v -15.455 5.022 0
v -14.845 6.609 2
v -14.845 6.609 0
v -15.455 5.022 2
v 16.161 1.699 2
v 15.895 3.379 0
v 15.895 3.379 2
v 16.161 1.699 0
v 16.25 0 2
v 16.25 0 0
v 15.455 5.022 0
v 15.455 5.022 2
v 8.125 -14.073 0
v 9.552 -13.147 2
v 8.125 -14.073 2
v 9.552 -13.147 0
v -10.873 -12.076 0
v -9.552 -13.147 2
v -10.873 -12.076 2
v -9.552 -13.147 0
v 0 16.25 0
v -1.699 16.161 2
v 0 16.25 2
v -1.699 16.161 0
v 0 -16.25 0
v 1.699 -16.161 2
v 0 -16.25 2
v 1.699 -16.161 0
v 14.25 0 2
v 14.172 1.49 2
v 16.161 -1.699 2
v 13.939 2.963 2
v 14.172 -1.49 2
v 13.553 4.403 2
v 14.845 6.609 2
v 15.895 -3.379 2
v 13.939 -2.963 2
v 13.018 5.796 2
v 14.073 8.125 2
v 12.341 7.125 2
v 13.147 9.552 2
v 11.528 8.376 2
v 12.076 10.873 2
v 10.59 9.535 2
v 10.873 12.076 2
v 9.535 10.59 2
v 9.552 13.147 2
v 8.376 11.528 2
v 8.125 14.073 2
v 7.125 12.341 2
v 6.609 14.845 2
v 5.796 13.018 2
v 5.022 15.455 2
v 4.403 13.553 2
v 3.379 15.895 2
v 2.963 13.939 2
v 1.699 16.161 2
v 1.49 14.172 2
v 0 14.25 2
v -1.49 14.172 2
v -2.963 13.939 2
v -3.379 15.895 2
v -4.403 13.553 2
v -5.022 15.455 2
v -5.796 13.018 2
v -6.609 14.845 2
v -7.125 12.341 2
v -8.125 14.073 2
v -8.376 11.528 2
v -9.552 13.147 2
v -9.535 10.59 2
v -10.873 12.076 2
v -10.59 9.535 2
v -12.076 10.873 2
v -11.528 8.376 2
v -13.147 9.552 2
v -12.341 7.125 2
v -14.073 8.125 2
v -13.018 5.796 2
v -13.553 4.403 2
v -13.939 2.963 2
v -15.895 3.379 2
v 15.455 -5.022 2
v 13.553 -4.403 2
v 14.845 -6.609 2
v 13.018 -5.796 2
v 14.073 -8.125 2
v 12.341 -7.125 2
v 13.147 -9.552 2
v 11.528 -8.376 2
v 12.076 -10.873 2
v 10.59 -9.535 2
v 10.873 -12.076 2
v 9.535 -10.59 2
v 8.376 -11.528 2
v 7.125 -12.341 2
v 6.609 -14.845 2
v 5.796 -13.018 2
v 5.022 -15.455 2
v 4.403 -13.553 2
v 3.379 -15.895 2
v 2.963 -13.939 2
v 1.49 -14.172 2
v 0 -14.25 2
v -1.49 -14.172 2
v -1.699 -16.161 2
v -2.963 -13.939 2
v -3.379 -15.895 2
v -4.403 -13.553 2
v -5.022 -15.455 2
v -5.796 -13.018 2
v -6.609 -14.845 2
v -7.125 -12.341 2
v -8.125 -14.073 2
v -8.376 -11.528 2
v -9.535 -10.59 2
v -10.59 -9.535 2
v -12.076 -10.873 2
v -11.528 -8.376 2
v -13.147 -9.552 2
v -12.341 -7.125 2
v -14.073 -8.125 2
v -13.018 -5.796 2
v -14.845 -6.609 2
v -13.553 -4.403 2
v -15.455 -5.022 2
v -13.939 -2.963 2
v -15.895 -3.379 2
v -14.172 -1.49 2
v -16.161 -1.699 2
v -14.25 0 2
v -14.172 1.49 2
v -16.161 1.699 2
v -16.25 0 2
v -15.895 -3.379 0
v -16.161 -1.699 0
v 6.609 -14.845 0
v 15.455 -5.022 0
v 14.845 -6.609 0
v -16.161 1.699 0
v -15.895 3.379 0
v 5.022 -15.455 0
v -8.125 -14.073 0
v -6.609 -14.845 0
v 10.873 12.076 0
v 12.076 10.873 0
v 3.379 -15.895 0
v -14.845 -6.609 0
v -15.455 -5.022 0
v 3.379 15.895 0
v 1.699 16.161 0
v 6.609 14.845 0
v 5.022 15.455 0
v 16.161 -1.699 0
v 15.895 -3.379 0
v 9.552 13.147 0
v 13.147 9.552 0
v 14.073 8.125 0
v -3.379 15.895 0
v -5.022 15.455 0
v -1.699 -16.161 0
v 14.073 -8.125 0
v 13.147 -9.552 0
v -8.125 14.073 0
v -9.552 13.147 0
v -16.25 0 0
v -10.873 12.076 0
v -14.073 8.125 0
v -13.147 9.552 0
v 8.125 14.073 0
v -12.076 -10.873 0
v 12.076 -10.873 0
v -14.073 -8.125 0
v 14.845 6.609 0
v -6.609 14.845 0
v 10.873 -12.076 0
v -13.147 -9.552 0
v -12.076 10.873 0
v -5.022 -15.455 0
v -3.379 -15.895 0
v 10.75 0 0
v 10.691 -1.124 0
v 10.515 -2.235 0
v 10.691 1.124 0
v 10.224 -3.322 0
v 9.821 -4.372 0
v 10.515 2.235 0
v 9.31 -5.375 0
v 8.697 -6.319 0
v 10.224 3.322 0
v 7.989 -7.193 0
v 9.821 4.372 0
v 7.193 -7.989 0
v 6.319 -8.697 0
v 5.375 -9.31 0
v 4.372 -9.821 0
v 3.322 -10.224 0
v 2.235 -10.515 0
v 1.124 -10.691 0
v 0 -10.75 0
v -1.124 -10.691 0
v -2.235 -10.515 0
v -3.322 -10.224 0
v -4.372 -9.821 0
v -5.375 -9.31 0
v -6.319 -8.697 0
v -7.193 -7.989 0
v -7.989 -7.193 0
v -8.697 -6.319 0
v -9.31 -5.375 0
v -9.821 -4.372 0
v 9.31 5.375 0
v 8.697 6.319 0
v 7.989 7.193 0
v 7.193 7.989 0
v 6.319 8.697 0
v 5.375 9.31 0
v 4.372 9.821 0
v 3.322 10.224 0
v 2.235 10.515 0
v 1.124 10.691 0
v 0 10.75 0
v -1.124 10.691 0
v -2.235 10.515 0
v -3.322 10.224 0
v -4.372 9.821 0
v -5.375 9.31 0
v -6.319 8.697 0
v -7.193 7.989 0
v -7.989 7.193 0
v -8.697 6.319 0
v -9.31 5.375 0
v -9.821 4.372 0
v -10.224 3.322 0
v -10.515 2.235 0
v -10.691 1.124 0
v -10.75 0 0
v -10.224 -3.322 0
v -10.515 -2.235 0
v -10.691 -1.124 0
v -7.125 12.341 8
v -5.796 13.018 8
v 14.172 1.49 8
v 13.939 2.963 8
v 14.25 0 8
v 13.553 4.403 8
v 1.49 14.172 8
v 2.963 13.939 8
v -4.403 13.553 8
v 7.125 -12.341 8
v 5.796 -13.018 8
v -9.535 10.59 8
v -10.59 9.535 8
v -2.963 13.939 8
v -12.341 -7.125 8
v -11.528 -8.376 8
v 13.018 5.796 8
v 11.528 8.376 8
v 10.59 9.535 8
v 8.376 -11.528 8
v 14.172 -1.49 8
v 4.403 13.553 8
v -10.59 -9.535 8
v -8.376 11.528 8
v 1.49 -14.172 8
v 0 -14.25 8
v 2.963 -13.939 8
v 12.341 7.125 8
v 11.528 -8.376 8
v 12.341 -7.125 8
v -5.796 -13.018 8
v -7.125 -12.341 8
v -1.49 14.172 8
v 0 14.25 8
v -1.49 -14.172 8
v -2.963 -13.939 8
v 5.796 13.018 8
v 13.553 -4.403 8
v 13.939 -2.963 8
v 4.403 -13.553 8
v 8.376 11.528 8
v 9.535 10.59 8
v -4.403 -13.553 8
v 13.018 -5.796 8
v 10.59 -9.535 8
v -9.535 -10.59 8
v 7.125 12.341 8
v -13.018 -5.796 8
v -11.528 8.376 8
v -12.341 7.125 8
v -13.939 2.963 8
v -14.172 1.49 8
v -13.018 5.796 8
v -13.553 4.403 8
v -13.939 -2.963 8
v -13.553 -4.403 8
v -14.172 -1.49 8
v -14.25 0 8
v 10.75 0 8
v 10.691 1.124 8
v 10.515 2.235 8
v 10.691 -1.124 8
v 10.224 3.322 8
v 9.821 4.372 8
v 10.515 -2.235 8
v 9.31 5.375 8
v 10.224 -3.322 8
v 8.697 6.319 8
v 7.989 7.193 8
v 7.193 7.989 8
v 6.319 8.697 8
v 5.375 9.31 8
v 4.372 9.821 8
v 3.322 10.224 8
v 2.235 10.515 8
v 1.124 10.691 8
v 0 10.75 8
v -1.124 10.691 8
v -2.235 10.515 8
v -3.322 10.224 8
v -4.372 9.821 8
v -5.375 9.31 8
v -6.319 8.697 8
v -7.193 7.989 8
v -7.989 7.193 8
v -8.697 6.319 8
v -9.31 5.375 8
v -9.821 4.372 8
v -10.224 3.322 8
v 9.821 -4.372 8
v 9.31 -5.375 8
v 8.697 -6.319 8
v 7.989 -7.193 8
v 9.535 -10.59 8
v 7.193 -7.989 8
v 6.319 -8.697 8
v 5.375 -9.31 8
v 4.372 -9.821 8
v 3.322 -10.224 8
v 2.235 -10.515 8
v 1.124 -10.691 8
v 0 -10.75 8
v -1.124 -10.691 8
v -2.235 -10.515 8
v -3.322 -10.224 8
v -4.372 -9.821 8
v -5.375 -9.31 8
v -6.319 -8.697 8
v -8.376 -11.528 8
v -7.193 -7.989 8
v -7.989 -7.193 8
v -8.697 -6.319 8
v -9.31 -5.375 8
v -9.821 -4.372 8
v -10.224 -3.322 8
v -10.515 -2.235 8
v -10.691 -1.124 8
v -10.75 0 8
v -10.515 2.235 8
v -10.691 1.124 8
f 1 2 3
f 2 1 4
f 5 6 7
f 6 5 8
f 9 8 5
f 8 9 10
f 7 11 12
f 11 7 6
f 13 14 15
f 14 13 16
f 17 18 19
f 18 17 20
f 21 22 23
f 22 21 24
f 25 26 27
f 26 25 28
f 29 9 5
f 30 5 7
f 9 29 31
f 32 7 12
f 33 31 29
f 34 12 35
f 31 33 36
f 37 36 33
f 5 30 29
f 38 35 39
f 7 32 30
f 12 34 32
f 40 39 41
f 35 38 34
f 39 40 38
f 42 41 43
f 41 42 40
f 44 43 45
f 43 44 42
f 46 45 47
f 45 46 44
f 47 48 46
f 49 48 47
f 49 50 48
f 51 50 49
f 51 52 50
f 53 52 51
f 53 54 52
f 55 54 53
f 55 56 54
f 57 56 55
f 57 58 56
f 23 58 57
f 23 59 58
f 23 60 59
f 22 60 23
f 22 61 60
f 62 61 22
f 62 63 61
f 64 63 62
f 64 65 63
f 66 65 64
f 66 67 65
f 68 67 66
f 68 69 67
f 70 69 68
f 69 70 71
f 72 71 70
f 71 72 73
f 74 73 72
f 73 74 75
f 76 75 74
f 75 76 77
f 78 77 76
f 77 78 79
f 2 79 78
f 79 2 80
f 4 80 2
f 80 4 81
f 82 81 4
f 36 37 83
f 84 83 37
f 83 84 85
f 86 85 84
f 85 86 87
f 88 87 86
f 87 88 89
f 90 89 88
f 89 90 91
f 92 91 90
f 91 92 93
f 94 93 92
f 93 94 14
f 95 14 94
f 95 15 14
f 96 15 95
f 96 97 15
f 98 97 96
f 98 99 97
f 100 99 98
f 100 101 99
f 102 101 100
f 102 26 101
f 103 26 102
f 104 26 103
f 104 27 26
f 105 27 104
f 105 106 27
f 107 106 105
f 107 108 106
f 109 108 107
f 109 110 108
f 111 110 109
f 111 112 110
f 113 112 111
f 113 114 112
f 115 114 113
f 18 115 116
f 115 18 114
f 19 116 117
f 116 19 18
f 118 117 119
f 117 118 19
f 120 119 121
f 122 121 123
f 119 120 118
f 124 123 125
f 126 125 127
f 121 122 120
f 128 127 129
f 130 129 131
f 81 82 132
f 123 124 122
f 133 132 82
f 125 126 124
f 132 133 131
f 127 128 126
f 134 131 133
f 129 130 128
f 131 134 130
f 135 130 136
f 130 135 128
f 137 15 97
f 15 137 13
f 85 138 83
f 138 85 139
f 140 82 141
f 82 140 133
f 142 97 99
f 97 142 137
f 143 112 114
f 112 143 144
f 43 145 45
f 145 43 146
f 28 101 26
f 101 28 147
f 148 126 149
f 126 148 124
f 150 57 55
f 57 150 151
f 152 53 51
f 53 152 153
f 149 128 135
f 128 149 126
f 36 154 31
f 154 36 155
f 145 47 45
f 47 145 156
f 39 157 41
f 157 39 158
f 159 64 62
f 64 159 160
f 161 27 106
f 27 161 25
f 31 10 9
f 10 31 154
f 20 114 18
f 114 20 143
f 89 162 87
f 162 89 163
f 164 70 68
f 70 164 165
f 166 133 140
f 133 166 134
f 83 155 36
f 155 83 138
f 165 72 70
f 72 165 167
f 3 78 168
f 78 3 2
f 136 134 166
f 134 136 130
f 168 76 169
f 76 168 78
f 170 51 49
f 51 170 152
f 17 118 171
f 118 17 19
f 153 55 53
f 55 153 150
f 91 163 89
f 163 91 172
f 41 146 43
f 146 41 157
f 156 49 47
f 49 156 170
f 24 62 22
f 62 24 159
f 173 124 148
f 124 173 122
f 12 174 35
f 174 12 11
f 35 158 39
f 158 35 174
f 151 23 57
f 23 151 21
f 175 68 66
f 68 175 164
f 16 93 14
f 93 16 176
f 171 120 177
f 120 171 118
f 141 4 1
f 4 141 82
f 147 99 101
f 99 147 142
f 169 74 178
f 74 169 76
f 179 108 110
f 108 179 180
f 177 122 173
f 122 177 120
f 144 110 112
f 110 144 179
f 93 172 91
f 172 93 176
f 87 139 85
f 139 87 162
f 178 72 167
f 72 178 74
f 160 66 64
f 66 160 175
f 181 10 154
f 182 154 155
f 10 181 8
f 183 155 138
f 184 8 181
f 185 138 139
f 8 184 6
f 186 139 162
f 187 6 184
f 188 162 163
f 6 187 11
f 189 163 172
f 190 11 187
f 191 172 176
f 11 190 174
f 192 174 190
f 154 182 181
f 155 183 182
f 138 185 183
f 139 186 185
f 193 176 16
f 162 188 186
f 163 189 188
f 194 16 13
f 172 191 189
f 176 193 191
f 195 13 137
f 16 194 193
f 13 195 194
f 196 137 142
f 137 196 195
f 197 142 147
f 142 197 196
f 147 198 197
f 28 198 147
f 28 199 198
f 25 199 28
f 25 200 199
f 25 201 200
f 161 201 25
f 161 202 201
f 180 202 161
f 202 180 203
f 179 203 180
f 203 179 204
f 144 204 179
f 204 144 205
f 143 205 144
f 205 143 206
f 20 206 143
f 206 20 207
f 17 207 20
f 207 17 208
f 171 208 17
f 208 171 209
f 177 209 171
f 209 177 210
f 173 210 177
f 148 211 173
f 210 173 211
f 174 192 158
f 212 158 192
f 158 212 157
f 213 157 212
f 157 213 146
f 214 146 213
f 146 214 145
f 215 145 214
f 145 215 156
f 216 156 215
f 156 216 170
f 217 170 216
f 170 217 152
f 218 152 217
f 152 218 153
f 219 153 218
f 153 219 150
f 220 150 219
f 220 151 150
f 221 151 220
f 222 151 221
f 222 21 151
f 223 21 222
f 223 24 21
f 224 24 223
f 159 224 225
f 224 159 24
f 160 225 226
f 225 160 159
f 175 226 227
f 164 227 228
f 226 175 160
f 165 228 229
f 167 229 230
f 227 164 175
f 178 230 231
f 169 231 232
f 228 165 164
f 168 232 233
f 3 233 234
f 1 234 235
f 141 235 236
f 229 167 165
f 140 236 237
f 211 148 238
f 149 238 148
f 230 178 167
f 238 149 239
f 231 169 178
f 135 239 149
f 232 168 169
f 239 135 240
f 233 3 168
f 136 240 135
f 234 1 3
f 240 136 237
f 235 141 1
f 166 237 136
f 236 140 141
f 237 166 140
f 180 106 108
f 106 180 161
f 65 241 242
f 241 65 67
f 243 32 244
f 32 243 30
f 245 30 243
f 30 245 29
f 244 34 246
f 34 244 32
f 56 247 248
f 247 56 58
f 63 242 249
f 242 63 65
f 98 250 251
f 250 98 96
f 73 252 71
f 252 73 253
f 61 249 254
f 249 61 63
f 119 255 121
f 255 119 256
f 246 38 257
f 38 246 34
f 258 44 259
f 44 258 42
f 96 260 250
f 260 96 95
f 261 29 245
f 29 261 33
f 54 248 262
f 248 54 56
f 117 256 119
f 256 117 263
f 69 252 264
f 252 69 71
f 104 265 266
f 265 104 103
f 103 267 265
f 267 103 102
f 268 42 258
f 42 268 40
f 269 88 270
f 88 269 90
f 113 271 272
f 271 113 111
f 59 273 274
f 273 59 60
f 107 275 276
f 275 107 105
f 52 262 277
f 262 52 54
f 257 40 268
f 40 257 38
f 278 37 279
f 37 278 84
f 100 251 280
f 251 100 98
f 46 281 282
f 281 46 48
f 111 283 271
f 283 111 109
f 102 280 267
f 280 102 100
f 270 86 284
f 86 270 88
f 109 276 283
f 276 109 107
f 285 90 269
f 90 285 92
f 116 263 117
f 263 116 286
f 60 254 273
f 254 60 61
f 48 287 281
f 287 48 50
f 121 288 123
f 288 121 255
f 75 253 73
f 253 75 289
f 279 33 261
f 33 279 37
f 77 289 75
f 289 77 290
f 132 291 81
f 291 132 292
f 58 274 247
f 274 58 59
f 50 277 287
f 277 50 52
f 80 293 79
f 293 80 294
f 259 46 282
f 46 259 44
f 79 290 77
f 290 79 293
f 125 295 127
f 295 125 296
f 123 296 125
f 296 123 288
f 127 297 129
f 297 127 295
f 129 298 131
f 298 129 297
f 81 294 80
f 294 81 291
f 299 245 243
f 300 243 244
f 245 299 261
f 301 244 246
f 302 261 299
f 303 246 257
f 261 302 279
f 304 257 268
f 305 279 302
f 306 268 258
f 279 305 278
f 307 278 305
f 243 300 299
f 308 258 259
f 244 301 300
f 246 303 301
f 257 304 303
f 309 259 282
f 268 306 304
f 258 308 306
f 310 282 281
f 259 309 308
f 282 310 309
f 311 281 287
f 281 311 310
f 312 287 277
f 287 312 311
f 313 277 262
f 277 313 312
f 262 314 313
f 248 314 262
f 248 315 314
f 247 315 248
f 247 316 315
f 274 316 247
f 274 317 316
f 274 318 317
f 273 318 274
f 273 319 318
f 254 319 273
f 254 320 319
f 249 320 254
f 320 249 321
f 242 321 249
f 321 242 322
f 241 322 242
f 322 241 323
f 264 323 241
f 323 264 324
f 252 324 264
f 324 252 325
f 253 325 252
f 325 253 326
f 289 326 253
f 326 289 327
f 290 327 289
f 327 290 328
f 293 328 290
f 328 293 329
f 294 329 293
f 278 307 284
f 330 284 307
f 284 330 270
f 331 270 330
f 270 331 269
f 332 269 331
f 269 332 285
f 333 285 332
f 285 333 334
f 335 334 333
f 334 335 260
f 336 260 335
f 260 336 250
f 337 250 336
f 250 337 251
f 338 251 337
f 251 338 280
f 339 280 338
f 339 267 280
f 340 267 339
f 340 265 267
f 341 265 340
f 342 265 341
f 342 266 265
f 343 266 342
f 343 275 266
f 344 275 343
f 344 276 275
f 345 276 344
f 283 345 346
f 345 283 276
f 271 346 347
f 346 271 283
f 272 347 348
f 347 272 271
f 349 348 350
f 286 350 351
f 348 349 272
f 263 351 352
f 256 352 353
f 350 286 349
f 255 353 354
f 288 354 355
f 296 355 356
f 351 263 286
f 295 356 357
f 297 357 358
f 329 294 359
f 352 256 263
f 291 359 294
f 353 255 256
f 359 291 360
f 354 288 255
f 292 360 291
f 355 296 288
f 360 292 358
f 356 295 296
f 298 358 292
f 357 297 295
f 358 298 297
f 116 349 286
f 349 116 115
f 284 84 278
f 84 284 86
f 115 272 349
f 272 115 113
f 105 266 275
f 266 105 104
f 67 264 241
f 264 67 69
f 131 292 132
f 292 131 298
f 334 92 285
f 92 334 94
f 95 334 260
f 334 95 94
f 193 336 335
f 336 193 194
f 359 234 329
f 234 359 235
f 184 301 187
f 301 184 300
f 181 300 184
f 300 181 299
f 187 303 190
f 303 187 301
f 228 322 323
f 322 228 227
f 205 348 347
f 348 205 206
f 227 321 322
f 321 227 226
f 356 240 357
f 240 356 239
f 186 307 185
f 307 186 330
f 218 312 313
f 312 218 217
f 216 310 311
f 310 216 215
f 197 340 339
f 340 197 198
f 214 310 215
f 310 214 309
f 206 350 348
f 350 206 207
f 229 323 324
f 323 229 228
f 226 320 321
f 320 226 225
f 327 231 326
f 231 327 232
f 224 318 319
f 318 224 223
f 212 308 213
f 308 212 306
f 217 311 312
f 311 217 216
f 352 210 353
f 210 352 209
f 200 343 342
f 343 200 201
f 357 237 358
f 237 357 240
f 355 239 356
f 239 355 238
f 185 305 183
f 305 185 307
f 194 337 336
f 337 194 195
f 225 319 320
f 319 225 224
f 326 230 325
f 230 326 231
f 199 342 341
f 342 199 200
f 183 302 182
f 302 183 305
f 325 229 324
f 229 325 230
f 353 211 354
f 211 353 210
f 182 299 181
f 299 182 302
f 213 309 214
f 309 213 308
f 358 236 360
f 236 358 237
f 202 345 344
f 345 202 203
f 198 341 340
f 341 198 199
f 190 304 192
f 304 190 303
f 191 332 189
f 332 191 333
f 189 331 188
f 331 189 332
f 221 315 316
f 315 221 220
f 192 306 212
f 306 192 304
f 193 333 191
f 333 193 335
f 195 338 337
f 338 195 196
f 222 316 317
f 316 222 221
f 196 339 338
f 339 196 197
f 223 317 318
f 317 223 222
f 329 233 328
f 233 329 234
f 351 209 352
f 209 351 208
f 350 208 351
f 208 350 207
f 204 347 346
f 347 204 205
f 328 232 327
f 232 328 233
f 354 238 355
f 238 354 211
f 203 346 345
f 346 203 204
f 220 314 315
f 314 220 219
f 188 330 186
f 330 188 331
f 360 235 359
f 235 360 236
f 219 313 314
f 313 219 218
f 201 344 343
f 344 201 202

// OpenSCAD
// a Reductor to adapt 10 ml conical tube to 4 in 1 Opentrons racks

DIA_IN = 21.5 ; 
DIA_EXT = 28.5 ; 
DIA_COLERETTE = 28.5 + 4 ; 

Z1 = 8 ; 
Z2 = 2 ; 

$fn= 60 ; 

module  adaptator(){
    difference(){
    union(){
    cylinder(d = DIA_COLERETTE, h = Z2);
     cylinder(d= DIA_EXT, h = Z1) ; 
    }
    translate([0,0,-1])
    cylinder(d= DIA_IN, h = 50);
    }
}


adaptator();
